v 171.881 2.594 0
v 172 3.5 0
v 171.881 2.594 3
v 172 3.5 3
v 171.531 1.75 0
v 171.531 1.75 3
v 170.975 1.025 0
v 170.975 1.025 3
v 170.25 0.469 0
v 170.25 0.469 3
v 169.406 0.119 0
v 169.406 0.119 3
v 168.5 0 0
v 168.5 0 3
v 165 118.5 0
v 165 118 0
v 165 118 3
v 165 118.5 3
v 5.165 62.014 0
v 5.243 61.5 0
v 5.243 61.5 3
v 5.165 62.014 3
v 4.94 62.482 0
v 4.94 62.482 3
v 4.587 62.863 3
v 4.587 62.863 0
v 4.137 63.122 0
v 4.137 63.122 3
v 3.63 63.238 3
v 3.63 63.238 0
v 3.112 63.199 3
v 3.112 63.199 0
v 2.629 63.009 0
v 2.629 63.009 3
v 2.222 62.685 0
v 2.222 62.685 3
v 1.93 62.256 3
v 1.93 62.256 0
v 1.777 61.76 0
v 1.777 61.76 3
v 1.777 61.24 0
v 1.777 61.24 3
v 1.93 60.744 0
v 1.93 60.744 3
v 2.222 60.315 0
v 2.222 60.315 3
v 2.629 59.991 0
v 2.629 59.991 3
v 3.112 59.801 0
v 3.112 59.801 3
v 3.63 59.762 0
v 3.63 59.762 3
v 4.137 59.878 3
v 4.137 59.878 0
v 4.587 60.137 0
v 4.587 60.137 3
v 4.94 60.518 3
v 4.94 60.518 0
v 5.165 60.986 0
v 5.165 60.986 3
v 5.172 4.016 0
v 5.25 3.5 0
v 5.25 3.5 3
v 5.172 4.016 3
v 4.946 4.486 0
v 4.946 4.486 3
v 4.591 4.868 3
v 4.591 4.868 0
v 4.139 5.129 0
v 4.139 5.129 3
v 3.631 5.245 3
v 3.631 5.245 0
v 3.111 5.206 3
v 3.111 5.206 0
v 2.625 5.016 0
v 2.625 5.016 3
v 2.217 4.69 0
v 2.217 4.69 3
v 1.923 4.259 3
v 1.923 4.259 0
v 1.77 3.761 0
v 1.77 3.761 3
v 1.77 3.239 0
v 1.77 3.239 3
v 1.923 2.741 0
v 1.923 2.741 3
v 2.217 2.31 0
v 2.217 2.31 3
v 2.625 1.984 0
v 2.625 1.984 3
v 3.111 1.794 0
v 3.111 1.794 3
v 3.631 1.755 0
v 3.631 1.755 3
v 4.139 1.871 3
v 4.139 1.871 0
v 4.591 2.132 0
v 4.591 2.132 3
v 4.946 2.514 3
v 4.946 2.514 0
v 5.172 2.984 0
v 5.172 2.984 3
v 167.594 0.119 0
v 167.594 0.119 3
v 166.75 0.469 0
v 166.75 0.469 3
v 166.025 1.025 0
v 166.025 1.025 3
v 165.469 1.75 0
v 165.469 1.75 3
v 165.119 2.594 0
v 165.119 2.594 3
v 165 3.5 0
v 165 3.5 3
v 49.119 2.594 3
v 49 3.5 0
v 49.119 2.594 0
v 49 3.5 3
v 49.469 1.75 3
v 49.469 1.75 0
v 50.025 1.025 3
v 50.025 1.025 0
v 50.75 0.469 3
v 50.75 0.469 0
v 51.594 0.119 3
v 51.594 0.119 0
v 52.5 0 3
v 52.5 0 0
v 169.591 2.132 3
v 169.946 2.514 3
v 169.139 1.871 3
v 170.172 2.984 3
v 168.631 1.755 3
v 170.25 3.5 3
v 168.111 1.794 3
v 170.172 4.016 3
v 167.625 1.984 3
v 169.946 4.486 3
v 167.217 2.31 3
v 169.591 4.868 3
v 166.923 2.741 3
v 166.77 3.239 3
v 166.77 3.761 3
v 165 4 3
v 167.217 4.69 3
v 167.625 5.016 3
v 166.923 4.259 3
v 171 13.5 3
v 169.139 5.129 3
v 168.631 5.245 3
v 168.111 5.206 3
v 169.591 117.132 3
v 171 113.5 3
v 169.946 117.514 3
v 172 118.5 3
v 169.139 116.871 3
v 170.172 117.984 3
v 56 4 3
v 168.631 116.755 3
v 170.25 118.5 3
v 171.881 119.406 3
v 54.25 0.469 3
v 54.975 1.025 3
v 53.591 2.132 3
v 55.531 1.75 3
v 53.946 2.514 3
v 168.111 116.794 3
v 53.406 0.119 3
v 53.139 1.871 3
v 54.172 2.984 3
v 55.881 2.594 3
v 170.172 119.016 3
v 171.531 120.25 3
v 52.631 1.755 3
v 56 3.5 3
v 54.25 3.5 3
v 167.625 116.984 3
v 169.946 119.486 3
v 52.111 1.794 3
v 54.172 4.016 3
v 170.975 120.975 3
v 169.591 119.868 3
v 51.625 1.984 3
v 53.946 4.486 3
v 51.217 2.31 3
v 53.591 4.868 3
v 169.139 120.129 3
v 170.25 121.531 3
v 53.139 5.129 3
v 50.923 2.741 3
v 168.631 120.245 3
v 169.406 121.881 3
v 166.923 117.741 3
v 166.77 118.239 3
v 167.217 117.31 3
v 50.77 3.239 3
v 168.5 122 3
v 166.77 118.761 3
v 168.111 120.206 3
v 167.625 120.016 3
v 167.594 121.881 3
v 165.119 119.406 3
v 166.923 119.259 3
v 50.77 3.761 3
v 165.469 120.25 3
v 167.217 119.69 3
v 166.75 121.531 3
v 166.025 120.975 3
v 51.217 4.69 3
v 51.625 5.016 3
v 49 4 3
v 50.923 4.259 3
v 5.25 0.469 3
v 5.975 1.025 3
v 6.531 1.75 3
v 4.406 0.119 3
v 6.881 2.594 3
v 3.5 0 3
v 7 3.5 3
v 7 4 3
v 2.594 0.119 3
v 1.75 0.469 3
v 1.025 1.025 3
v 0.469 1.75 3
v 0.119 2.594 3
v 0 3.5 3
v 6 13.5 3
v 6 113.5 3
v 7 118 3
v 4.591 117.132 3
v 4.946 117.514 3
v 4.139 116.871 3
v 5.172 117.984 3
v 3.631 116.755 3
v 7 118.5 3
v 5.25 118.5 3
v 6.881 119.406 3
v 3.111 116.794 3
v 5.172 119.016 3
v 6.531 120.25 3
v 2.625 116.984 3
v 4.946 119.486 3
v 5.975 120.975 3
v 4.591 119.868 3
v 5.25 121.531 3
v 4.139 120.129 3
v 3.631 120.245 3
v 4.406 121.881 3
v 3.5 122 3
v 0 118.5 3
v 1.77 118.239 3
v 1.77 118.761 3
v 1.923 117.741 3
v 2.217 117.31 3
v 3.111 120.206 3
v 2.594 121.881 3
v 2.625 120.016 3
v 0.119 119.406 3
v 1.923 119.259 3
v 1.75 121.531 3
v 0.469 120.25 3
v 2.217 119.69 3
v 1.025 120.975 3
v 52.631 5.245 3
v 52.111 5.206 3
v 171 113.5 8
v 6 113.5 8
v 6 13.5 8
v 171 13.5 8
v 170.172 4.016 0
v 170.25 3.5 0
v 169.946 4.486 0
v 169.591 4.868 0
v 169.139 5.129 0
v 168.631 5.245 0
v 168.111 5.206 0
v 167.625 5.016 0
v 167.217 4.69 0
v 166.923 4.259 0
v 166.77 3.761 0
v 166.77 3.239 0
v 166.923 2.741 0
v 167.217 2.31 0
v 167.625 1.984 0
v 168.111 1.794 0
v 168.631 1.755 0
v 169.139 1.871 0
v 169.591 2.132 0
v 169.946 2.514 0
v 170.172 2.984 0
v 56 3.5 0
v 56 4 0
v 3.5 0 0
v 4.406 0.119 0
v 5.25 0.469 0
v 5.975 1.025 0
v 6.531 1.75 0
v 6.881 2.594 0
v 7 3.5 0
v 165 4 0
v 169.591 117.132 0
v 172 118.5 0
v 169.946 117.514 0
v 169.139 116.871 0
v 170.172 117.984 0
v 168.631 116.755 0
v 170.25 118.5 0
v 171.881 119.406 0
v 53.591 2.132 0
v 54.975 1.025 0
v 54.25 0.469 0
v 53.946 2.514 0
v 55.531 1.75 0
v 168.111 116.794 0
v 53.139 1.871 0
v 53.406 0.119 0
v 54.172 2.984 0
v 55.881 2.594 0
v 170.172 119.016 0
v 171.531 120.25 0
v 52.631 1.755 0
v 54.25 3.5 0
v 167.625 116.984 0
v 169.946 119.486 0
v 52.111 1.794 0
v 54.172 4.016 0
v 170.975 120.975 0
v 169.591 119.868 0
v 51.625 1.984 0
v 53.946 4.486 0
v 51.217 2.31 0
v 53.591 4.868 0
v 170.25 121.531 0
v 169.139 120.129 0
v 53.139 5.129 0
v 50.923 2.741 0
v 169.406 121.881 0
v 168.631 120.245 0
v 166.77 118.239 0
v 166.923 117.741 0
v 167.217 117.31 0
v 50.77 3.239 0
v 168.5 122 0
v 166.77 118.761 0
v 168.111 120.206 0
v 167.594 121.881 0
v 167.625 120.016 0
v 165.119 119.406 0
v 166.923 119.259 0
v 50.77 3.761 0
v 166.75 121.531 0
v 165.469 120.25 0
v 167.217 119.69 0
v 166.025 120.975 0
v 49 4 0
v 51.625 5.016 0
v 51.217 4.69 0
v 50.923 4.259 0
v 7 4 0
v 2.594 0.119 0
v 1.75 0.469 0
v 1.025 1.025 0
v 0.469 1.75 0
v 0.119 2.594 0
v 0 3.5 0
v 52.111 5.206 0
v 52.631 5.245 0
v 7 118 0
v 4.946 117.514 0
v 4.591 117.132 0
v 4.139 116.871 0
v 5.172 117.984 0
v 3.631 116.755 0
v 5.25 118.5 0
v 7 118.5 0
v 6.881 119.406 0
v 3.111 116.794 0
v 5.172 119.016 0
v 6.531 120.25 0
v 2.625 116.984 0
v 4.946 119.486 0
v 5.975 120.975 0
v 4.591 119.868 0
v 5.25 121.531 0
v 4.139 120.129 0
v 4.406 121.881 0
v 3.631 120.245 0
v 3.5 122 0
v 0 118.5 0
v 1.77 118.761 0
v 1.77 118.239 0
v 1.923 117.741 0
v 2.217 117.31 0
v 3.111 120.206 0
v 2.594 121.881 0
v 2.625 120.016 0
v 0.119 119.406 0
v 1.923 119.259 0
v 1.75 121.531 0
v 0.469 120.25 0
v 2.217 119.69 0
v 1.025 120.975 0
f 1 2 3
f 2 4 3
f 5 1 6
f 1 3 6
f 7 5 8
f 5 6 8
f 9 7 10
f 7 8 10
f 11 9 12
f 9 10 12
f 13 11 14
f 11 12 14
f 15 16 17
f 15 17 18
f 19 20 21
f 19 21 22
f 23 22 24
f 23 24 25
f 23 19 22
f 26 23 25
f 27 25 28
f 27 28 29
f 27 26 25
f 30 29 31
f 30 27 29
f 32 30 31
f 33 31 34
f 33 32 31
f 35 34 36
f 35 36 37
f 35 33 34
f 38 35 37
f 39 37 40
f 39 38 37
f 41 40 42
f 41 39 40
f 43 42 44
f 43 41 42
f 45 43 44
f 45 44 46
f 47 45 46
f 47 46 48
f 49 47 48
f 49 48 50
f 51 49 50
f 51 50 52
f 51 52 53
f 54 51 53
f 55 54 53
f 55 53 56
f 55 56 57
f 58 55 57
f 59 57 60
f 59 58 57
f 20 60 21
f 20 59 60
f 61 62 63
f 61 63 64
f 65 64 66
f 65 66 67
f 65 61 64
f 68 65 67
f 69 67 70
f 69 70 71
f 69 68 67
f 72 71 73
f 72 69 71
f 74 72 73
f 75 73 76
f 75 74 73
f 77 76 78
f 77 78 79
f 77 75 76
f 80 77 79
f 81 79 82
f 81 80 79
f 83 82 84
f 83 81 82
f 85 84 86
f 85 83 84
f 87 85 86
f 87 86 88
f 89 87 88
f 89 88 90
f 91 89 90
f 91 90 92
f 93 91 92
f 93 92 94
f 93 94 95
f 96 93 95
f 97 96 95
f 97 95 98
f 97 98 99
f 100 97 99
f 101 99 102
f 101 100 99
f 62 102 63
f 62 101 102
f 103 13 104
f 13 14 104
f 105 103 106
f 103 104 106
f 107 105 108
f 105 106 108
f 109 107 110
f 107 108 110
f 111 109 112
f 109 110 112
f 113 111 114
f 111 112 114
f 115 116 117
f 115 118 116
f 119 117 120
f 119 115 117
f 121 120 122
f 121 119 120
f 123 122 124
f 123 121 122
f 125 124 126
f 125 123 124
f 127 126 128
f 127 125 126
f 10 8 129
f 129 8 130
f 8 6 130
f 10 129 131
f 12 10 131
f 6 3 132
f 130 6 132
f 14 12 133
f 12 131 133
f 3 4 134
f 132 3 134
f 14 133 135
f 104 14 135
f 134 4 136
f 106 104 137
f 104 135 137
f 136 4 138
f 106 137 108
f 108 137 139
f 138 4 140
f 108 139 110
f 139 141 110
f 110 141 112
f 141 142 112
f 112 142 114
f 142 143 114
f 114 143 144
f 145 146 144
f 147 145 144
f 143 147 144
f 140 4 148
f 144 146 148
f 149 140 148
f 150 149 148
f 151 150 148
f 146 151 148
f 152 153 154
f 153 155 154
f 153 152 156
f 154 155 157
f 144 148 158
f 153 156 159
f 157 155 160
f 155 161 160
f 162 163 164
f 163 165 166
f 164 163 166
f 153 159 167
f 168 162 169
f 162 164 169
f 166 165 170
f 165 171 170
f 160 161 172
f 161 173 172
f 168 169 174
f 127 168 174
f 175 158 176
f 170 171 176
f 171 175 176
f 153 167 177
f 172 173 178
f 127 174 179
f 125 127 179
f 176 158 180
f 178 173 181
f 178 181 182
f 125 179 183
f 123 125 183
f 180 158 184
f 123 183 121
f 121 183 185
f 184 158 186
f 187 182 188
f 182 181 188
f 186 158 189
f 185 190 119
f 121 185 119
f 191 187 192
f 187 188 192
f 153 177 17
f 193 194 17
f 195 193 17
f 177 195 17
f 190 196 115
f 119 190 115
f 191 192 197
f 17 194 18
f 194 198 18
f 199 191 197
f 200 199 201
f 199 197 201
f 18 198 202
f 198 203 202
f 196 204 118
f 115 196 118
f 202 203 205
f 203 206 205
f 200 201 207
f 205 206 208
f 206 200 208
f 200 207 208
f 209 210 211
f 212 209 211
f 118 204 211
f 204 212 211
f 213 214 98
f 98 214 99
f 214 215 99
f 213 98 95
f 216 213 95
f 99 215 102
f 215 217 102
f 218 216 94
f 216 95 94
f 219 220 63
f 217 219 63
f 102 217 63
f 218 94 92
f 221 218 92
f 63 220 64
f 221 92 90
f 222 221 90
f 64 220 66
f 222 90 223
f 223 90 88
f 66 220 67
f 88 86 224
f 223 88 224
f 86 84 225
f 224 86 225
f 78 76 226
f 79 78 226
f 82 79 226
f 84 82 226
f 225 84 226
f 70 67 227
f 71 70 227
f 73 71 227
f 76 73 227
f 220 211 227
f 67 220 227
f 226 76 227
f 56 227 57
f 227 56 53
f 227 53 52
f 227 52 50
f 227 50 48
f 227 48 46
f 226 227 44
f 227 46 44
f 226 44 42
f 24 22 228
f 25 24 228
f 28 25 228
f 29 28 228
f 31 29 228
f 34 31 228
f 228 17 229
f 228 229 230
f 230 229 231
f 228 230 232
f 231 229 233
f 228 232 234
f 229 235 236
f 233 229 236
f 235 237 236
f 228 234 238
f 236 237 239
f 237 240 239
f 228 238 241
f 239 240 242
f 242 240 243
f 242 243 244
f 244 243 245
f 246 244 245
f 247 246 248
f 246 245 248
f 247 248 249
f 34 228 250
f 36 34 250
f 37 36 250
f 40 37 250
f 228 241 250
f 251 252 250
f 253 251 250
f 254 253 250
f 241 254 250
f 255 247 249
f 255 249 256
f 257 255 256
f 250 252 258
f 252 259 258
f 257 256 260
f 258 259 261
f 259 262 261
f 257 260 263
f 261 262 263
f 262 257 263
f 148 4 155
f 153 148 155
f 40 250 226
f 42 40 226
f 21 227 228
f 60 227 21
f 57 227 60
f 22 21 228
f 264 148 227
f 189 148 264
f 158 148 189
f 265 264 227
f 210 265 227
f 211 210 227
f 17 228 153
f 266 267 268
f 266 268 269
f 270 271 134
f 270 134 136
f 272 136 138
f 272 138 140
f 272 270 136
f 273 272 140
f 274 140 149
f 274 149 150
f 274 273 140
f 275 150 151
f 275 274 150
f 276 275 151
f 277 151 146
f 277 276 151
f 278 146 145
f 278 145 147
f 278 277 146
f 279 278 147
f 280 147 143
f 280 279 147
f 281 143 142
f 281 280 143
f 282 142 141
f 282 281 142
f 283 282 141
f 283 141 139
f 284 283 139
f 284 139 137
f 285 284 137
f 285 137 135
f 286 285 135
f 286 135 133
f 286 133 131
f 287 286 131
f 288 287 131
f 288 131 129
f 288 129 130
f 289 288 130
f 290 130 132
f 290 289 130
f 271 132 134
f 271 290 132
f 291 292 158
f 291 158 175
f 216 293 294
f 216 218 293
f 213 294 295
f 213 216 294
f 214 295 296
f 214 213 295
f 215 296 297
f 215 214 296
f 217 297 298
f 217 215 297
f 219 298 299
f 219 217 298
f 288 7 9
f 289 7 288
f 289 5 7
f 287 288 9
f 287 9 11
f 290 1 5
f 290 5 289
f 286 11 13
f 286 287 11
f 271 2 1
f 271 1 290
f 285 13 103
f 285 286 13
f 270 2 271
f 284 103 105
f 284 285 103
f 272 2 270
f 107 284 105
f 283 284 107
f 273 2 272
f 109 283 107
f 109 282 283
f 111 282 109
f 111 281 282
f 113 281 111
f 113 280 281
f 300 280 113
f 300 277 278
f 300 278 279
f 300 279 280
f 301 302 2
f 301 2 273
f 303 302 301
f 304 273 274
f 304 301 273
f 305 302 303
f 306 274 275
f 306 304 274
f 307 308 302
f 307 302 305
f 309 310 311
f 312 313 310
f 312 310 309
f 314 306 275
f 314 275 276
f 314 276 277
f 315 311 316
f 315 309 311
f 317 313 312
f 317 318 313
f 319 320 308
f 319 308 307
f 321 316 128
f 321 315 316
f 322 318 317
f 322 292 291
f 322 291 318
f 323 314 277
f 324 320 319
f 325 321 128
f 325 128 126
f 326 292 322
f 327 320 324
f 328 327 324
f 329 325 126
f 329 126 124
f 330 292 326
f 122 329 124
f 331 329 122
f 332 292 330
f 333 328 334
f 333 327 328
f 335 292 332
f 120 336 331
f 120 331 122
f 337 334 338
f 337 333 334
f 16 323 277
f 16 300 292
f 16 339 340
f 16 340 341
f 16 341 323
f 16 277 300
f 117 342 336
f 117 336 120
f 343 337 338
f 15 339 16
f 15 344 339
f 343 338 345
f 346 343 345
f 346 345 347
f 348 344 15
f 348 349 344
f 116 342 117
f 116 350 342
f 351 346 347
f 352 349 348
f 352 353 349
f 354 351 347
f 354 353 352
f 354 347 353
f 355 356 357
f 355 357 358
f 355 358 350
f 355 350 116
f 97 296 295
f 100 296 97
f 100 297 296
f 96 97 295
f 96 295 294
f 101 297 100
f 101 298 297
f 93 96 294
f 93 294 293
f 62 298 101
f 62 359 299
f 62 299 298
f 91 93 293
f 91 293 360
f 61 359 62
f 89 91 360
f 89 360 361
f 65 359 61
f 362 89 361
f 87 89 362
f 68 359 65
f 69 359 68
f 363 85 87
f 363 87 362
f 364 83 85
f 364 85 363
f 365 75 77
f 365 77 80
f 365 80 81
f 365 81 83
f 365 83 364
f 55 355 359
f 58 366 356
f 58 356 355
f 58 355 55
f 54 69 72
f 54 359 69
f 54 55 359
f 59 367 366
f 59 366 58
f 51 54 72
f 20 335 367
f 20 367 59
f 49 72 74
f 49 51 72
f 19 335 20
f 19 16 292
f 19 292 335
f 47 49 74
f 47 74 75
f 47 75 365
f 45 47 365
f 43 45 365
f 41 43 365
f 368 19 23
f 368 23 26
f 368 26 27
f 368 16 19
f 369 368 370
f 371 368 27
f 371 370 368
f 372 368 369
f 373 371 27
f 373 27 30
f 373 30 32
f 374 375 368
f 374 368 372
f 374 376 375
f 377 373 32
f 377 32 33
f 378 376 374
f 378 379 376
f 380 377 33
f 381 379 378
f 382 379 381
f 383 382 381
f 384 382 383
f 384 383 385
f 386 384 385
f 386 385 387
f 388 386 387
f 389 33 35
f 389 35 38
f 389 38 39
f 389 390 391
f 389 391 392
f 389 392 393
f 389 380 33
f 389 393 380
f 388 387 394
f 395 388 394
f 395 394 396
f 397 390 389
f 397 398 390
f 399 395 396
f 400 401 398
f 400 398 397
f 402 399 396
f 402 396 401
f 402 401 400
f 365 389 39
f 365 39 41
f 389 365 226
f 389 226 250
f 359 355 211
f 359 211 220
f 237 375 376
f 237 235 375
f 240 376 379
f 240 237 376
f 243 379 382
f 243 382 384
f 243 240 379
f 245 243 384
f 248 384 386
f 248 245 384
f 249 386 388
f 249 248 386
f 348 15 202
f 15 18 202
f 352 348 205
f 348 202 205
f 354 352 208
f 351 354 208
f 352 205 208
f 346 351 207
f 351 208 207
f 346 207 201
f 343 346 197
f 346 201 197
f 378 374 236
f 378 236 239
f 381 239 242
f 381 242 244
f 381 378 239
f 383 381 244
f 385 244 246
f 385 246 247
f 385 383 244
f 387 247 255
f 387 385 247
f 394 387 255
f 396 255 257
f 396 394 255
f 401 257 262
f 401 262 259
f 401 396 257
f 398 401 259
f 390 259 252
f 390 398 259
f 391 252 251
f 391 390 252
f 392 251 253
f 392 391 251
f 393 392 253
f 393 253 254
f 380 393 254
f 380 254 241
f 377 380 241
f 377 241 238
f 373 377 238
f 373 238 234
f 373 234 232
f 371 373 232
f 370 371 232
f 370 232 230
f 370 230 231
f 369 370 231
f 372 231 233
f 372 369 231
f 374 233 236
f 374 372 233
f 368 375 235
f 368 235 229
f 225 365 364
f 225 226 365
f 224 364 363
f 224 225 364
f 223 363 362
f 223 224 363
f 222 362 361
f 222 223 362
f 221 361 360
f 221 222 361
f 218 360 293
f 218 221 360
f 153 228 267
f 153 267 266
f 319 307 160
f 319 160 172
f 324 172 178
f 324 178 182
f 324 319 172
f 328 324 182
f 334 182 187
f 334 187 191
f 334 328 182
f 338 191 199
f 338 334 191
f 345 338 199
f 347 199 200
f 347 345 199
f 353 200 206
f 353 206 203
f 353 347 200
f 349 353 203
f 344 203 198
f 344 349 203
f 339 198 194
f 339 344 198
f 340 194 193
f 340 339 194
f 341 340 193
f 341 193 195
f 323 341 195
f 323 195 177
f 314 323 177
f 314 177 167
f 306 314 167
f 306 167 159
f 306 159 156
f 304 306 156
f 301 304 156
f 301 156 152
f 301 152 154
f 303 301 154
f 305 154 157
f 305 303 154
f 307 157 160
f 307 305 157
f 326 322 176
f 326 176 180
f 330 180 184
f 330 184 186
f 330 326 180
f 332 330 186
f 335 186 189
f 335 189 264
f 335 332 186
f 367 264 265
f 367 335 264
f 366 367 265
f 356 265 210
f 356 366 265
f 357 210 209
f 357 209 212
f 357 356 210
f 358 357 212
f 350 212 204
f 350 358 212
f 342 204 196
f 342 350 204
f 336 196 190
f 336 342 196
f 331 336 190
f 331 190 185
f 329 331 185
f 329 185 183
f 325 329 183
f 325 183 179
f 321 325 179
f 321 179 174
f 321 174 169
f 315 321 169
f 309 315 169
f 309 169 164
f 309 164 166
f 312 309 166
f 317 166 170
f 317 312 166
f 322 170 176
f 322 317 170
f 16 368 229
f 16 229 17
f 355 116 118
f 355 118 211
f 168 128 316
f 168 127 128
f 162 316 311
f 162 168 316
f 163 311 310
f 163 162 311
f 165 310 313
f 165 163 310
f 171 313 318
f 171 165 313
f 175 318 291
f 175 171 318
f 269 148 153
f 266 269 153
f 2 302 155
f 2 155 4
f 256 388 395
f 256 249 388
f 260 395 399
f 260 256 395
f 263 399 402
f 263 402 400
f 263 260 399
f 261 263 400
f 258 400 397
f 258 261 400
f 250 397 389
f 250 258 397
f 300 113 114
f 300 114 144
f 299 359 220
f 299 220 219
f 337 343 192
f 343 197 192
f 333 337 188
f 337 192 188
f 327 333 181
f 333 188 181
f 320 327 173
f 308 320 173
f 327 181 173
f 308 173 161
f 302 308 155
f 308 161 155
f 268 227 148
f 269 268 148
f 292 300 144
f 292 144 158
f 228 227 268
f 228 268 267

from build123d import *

# Parameters (mm, degrees)
SKETCH1_W           = 165
SKETCH1_H           = 100
BOSS_EXTRUDE1_DEPTH = 8
SKETCH1_4_R         = 1.75
SKETCH1_4_R_2       = 1.742752204
SKETCH1_4_W         = 165
SKETCH1_4_H         = 100
BOSS_EXTRUDE2_DEPTH = 3
FILLET3_R           = 3.5


with BuildPart() as part:
    # Sketch1 → Boss-Extrude1 (new body)
    with BuildSketch(Plane.XY):
        with Locations((88.5, 63.5)):
            Rectangle(SKETCH1_W, SKETCH1_H)
    extrude(amount=BOSS_EXTRUDE1_DEPTH)

    # Sketch1<4> → Boss-Extrude2 (add)
    with BuildSketch(Plane.XY):
        Polygon((7, 122), (7, 118), (165, 118), (165, 122), (172, 122), (172, 0), (165, 0), (165, 4), (56, 4), (56, 0), (49, 0), (49, 4), (7, 4), (7, 0), (0, 0), (0, 122), align=None)
        with Locations((3.5, 118.5)):
            Circle(SKETCH1_4_R, mode=Mode.SUBTRACT)
        with Locations((168.5, 118.5)):
            Circle(SKETCH1_4_R, mode=Mode.SUBTRACT)
        with Locations((168.5, 3.5)):
            Circle(SKETCH1_4_R, mode=Mode.SUBTRACT)
        with Locations((3.5, 3.5)):
            Circle(SKETCH1_4_R, mode=Mode.SUBTRACT)
        with Locations((52.5, 3.5)):
            Circle(SKETCH1_4_R, mode=Mode.SUBTRACT)
        with Locations((3.5, 61.5)):
            Circle(SKETCH1_4_R_2, mode=Mode.SUBTRACT)
        with Locations((88.5, 63.5)):
            Rectangle(SKETCH1_4_W, SKETCH1_4_H, mode=Mode.SUBTRACT)
    extrude(amount=BOSS_EXTRUDE2_DEPTH)

    # Fillet3
    fillet3_edges = [part.edges().sort_by_distance(p)[0] for p in [
        (56, 0, 1.5),
        (165, 0, 1.5),
        (172, 0, 1.5),
        (49, 0, 1.5),
        (0, 0, 1.5),
        (7, 0, 1.5),
        (0, 122, 1.5),
        (7, 122, 1.5),
        (172, 122, 1.5),
        (165, 122, 1.5),
    ]]
    fillet(fillet3_edges, radius=FILLET3_R - 0.0001)  # a hair under: the kernel refuses the full size


solid = part.part
